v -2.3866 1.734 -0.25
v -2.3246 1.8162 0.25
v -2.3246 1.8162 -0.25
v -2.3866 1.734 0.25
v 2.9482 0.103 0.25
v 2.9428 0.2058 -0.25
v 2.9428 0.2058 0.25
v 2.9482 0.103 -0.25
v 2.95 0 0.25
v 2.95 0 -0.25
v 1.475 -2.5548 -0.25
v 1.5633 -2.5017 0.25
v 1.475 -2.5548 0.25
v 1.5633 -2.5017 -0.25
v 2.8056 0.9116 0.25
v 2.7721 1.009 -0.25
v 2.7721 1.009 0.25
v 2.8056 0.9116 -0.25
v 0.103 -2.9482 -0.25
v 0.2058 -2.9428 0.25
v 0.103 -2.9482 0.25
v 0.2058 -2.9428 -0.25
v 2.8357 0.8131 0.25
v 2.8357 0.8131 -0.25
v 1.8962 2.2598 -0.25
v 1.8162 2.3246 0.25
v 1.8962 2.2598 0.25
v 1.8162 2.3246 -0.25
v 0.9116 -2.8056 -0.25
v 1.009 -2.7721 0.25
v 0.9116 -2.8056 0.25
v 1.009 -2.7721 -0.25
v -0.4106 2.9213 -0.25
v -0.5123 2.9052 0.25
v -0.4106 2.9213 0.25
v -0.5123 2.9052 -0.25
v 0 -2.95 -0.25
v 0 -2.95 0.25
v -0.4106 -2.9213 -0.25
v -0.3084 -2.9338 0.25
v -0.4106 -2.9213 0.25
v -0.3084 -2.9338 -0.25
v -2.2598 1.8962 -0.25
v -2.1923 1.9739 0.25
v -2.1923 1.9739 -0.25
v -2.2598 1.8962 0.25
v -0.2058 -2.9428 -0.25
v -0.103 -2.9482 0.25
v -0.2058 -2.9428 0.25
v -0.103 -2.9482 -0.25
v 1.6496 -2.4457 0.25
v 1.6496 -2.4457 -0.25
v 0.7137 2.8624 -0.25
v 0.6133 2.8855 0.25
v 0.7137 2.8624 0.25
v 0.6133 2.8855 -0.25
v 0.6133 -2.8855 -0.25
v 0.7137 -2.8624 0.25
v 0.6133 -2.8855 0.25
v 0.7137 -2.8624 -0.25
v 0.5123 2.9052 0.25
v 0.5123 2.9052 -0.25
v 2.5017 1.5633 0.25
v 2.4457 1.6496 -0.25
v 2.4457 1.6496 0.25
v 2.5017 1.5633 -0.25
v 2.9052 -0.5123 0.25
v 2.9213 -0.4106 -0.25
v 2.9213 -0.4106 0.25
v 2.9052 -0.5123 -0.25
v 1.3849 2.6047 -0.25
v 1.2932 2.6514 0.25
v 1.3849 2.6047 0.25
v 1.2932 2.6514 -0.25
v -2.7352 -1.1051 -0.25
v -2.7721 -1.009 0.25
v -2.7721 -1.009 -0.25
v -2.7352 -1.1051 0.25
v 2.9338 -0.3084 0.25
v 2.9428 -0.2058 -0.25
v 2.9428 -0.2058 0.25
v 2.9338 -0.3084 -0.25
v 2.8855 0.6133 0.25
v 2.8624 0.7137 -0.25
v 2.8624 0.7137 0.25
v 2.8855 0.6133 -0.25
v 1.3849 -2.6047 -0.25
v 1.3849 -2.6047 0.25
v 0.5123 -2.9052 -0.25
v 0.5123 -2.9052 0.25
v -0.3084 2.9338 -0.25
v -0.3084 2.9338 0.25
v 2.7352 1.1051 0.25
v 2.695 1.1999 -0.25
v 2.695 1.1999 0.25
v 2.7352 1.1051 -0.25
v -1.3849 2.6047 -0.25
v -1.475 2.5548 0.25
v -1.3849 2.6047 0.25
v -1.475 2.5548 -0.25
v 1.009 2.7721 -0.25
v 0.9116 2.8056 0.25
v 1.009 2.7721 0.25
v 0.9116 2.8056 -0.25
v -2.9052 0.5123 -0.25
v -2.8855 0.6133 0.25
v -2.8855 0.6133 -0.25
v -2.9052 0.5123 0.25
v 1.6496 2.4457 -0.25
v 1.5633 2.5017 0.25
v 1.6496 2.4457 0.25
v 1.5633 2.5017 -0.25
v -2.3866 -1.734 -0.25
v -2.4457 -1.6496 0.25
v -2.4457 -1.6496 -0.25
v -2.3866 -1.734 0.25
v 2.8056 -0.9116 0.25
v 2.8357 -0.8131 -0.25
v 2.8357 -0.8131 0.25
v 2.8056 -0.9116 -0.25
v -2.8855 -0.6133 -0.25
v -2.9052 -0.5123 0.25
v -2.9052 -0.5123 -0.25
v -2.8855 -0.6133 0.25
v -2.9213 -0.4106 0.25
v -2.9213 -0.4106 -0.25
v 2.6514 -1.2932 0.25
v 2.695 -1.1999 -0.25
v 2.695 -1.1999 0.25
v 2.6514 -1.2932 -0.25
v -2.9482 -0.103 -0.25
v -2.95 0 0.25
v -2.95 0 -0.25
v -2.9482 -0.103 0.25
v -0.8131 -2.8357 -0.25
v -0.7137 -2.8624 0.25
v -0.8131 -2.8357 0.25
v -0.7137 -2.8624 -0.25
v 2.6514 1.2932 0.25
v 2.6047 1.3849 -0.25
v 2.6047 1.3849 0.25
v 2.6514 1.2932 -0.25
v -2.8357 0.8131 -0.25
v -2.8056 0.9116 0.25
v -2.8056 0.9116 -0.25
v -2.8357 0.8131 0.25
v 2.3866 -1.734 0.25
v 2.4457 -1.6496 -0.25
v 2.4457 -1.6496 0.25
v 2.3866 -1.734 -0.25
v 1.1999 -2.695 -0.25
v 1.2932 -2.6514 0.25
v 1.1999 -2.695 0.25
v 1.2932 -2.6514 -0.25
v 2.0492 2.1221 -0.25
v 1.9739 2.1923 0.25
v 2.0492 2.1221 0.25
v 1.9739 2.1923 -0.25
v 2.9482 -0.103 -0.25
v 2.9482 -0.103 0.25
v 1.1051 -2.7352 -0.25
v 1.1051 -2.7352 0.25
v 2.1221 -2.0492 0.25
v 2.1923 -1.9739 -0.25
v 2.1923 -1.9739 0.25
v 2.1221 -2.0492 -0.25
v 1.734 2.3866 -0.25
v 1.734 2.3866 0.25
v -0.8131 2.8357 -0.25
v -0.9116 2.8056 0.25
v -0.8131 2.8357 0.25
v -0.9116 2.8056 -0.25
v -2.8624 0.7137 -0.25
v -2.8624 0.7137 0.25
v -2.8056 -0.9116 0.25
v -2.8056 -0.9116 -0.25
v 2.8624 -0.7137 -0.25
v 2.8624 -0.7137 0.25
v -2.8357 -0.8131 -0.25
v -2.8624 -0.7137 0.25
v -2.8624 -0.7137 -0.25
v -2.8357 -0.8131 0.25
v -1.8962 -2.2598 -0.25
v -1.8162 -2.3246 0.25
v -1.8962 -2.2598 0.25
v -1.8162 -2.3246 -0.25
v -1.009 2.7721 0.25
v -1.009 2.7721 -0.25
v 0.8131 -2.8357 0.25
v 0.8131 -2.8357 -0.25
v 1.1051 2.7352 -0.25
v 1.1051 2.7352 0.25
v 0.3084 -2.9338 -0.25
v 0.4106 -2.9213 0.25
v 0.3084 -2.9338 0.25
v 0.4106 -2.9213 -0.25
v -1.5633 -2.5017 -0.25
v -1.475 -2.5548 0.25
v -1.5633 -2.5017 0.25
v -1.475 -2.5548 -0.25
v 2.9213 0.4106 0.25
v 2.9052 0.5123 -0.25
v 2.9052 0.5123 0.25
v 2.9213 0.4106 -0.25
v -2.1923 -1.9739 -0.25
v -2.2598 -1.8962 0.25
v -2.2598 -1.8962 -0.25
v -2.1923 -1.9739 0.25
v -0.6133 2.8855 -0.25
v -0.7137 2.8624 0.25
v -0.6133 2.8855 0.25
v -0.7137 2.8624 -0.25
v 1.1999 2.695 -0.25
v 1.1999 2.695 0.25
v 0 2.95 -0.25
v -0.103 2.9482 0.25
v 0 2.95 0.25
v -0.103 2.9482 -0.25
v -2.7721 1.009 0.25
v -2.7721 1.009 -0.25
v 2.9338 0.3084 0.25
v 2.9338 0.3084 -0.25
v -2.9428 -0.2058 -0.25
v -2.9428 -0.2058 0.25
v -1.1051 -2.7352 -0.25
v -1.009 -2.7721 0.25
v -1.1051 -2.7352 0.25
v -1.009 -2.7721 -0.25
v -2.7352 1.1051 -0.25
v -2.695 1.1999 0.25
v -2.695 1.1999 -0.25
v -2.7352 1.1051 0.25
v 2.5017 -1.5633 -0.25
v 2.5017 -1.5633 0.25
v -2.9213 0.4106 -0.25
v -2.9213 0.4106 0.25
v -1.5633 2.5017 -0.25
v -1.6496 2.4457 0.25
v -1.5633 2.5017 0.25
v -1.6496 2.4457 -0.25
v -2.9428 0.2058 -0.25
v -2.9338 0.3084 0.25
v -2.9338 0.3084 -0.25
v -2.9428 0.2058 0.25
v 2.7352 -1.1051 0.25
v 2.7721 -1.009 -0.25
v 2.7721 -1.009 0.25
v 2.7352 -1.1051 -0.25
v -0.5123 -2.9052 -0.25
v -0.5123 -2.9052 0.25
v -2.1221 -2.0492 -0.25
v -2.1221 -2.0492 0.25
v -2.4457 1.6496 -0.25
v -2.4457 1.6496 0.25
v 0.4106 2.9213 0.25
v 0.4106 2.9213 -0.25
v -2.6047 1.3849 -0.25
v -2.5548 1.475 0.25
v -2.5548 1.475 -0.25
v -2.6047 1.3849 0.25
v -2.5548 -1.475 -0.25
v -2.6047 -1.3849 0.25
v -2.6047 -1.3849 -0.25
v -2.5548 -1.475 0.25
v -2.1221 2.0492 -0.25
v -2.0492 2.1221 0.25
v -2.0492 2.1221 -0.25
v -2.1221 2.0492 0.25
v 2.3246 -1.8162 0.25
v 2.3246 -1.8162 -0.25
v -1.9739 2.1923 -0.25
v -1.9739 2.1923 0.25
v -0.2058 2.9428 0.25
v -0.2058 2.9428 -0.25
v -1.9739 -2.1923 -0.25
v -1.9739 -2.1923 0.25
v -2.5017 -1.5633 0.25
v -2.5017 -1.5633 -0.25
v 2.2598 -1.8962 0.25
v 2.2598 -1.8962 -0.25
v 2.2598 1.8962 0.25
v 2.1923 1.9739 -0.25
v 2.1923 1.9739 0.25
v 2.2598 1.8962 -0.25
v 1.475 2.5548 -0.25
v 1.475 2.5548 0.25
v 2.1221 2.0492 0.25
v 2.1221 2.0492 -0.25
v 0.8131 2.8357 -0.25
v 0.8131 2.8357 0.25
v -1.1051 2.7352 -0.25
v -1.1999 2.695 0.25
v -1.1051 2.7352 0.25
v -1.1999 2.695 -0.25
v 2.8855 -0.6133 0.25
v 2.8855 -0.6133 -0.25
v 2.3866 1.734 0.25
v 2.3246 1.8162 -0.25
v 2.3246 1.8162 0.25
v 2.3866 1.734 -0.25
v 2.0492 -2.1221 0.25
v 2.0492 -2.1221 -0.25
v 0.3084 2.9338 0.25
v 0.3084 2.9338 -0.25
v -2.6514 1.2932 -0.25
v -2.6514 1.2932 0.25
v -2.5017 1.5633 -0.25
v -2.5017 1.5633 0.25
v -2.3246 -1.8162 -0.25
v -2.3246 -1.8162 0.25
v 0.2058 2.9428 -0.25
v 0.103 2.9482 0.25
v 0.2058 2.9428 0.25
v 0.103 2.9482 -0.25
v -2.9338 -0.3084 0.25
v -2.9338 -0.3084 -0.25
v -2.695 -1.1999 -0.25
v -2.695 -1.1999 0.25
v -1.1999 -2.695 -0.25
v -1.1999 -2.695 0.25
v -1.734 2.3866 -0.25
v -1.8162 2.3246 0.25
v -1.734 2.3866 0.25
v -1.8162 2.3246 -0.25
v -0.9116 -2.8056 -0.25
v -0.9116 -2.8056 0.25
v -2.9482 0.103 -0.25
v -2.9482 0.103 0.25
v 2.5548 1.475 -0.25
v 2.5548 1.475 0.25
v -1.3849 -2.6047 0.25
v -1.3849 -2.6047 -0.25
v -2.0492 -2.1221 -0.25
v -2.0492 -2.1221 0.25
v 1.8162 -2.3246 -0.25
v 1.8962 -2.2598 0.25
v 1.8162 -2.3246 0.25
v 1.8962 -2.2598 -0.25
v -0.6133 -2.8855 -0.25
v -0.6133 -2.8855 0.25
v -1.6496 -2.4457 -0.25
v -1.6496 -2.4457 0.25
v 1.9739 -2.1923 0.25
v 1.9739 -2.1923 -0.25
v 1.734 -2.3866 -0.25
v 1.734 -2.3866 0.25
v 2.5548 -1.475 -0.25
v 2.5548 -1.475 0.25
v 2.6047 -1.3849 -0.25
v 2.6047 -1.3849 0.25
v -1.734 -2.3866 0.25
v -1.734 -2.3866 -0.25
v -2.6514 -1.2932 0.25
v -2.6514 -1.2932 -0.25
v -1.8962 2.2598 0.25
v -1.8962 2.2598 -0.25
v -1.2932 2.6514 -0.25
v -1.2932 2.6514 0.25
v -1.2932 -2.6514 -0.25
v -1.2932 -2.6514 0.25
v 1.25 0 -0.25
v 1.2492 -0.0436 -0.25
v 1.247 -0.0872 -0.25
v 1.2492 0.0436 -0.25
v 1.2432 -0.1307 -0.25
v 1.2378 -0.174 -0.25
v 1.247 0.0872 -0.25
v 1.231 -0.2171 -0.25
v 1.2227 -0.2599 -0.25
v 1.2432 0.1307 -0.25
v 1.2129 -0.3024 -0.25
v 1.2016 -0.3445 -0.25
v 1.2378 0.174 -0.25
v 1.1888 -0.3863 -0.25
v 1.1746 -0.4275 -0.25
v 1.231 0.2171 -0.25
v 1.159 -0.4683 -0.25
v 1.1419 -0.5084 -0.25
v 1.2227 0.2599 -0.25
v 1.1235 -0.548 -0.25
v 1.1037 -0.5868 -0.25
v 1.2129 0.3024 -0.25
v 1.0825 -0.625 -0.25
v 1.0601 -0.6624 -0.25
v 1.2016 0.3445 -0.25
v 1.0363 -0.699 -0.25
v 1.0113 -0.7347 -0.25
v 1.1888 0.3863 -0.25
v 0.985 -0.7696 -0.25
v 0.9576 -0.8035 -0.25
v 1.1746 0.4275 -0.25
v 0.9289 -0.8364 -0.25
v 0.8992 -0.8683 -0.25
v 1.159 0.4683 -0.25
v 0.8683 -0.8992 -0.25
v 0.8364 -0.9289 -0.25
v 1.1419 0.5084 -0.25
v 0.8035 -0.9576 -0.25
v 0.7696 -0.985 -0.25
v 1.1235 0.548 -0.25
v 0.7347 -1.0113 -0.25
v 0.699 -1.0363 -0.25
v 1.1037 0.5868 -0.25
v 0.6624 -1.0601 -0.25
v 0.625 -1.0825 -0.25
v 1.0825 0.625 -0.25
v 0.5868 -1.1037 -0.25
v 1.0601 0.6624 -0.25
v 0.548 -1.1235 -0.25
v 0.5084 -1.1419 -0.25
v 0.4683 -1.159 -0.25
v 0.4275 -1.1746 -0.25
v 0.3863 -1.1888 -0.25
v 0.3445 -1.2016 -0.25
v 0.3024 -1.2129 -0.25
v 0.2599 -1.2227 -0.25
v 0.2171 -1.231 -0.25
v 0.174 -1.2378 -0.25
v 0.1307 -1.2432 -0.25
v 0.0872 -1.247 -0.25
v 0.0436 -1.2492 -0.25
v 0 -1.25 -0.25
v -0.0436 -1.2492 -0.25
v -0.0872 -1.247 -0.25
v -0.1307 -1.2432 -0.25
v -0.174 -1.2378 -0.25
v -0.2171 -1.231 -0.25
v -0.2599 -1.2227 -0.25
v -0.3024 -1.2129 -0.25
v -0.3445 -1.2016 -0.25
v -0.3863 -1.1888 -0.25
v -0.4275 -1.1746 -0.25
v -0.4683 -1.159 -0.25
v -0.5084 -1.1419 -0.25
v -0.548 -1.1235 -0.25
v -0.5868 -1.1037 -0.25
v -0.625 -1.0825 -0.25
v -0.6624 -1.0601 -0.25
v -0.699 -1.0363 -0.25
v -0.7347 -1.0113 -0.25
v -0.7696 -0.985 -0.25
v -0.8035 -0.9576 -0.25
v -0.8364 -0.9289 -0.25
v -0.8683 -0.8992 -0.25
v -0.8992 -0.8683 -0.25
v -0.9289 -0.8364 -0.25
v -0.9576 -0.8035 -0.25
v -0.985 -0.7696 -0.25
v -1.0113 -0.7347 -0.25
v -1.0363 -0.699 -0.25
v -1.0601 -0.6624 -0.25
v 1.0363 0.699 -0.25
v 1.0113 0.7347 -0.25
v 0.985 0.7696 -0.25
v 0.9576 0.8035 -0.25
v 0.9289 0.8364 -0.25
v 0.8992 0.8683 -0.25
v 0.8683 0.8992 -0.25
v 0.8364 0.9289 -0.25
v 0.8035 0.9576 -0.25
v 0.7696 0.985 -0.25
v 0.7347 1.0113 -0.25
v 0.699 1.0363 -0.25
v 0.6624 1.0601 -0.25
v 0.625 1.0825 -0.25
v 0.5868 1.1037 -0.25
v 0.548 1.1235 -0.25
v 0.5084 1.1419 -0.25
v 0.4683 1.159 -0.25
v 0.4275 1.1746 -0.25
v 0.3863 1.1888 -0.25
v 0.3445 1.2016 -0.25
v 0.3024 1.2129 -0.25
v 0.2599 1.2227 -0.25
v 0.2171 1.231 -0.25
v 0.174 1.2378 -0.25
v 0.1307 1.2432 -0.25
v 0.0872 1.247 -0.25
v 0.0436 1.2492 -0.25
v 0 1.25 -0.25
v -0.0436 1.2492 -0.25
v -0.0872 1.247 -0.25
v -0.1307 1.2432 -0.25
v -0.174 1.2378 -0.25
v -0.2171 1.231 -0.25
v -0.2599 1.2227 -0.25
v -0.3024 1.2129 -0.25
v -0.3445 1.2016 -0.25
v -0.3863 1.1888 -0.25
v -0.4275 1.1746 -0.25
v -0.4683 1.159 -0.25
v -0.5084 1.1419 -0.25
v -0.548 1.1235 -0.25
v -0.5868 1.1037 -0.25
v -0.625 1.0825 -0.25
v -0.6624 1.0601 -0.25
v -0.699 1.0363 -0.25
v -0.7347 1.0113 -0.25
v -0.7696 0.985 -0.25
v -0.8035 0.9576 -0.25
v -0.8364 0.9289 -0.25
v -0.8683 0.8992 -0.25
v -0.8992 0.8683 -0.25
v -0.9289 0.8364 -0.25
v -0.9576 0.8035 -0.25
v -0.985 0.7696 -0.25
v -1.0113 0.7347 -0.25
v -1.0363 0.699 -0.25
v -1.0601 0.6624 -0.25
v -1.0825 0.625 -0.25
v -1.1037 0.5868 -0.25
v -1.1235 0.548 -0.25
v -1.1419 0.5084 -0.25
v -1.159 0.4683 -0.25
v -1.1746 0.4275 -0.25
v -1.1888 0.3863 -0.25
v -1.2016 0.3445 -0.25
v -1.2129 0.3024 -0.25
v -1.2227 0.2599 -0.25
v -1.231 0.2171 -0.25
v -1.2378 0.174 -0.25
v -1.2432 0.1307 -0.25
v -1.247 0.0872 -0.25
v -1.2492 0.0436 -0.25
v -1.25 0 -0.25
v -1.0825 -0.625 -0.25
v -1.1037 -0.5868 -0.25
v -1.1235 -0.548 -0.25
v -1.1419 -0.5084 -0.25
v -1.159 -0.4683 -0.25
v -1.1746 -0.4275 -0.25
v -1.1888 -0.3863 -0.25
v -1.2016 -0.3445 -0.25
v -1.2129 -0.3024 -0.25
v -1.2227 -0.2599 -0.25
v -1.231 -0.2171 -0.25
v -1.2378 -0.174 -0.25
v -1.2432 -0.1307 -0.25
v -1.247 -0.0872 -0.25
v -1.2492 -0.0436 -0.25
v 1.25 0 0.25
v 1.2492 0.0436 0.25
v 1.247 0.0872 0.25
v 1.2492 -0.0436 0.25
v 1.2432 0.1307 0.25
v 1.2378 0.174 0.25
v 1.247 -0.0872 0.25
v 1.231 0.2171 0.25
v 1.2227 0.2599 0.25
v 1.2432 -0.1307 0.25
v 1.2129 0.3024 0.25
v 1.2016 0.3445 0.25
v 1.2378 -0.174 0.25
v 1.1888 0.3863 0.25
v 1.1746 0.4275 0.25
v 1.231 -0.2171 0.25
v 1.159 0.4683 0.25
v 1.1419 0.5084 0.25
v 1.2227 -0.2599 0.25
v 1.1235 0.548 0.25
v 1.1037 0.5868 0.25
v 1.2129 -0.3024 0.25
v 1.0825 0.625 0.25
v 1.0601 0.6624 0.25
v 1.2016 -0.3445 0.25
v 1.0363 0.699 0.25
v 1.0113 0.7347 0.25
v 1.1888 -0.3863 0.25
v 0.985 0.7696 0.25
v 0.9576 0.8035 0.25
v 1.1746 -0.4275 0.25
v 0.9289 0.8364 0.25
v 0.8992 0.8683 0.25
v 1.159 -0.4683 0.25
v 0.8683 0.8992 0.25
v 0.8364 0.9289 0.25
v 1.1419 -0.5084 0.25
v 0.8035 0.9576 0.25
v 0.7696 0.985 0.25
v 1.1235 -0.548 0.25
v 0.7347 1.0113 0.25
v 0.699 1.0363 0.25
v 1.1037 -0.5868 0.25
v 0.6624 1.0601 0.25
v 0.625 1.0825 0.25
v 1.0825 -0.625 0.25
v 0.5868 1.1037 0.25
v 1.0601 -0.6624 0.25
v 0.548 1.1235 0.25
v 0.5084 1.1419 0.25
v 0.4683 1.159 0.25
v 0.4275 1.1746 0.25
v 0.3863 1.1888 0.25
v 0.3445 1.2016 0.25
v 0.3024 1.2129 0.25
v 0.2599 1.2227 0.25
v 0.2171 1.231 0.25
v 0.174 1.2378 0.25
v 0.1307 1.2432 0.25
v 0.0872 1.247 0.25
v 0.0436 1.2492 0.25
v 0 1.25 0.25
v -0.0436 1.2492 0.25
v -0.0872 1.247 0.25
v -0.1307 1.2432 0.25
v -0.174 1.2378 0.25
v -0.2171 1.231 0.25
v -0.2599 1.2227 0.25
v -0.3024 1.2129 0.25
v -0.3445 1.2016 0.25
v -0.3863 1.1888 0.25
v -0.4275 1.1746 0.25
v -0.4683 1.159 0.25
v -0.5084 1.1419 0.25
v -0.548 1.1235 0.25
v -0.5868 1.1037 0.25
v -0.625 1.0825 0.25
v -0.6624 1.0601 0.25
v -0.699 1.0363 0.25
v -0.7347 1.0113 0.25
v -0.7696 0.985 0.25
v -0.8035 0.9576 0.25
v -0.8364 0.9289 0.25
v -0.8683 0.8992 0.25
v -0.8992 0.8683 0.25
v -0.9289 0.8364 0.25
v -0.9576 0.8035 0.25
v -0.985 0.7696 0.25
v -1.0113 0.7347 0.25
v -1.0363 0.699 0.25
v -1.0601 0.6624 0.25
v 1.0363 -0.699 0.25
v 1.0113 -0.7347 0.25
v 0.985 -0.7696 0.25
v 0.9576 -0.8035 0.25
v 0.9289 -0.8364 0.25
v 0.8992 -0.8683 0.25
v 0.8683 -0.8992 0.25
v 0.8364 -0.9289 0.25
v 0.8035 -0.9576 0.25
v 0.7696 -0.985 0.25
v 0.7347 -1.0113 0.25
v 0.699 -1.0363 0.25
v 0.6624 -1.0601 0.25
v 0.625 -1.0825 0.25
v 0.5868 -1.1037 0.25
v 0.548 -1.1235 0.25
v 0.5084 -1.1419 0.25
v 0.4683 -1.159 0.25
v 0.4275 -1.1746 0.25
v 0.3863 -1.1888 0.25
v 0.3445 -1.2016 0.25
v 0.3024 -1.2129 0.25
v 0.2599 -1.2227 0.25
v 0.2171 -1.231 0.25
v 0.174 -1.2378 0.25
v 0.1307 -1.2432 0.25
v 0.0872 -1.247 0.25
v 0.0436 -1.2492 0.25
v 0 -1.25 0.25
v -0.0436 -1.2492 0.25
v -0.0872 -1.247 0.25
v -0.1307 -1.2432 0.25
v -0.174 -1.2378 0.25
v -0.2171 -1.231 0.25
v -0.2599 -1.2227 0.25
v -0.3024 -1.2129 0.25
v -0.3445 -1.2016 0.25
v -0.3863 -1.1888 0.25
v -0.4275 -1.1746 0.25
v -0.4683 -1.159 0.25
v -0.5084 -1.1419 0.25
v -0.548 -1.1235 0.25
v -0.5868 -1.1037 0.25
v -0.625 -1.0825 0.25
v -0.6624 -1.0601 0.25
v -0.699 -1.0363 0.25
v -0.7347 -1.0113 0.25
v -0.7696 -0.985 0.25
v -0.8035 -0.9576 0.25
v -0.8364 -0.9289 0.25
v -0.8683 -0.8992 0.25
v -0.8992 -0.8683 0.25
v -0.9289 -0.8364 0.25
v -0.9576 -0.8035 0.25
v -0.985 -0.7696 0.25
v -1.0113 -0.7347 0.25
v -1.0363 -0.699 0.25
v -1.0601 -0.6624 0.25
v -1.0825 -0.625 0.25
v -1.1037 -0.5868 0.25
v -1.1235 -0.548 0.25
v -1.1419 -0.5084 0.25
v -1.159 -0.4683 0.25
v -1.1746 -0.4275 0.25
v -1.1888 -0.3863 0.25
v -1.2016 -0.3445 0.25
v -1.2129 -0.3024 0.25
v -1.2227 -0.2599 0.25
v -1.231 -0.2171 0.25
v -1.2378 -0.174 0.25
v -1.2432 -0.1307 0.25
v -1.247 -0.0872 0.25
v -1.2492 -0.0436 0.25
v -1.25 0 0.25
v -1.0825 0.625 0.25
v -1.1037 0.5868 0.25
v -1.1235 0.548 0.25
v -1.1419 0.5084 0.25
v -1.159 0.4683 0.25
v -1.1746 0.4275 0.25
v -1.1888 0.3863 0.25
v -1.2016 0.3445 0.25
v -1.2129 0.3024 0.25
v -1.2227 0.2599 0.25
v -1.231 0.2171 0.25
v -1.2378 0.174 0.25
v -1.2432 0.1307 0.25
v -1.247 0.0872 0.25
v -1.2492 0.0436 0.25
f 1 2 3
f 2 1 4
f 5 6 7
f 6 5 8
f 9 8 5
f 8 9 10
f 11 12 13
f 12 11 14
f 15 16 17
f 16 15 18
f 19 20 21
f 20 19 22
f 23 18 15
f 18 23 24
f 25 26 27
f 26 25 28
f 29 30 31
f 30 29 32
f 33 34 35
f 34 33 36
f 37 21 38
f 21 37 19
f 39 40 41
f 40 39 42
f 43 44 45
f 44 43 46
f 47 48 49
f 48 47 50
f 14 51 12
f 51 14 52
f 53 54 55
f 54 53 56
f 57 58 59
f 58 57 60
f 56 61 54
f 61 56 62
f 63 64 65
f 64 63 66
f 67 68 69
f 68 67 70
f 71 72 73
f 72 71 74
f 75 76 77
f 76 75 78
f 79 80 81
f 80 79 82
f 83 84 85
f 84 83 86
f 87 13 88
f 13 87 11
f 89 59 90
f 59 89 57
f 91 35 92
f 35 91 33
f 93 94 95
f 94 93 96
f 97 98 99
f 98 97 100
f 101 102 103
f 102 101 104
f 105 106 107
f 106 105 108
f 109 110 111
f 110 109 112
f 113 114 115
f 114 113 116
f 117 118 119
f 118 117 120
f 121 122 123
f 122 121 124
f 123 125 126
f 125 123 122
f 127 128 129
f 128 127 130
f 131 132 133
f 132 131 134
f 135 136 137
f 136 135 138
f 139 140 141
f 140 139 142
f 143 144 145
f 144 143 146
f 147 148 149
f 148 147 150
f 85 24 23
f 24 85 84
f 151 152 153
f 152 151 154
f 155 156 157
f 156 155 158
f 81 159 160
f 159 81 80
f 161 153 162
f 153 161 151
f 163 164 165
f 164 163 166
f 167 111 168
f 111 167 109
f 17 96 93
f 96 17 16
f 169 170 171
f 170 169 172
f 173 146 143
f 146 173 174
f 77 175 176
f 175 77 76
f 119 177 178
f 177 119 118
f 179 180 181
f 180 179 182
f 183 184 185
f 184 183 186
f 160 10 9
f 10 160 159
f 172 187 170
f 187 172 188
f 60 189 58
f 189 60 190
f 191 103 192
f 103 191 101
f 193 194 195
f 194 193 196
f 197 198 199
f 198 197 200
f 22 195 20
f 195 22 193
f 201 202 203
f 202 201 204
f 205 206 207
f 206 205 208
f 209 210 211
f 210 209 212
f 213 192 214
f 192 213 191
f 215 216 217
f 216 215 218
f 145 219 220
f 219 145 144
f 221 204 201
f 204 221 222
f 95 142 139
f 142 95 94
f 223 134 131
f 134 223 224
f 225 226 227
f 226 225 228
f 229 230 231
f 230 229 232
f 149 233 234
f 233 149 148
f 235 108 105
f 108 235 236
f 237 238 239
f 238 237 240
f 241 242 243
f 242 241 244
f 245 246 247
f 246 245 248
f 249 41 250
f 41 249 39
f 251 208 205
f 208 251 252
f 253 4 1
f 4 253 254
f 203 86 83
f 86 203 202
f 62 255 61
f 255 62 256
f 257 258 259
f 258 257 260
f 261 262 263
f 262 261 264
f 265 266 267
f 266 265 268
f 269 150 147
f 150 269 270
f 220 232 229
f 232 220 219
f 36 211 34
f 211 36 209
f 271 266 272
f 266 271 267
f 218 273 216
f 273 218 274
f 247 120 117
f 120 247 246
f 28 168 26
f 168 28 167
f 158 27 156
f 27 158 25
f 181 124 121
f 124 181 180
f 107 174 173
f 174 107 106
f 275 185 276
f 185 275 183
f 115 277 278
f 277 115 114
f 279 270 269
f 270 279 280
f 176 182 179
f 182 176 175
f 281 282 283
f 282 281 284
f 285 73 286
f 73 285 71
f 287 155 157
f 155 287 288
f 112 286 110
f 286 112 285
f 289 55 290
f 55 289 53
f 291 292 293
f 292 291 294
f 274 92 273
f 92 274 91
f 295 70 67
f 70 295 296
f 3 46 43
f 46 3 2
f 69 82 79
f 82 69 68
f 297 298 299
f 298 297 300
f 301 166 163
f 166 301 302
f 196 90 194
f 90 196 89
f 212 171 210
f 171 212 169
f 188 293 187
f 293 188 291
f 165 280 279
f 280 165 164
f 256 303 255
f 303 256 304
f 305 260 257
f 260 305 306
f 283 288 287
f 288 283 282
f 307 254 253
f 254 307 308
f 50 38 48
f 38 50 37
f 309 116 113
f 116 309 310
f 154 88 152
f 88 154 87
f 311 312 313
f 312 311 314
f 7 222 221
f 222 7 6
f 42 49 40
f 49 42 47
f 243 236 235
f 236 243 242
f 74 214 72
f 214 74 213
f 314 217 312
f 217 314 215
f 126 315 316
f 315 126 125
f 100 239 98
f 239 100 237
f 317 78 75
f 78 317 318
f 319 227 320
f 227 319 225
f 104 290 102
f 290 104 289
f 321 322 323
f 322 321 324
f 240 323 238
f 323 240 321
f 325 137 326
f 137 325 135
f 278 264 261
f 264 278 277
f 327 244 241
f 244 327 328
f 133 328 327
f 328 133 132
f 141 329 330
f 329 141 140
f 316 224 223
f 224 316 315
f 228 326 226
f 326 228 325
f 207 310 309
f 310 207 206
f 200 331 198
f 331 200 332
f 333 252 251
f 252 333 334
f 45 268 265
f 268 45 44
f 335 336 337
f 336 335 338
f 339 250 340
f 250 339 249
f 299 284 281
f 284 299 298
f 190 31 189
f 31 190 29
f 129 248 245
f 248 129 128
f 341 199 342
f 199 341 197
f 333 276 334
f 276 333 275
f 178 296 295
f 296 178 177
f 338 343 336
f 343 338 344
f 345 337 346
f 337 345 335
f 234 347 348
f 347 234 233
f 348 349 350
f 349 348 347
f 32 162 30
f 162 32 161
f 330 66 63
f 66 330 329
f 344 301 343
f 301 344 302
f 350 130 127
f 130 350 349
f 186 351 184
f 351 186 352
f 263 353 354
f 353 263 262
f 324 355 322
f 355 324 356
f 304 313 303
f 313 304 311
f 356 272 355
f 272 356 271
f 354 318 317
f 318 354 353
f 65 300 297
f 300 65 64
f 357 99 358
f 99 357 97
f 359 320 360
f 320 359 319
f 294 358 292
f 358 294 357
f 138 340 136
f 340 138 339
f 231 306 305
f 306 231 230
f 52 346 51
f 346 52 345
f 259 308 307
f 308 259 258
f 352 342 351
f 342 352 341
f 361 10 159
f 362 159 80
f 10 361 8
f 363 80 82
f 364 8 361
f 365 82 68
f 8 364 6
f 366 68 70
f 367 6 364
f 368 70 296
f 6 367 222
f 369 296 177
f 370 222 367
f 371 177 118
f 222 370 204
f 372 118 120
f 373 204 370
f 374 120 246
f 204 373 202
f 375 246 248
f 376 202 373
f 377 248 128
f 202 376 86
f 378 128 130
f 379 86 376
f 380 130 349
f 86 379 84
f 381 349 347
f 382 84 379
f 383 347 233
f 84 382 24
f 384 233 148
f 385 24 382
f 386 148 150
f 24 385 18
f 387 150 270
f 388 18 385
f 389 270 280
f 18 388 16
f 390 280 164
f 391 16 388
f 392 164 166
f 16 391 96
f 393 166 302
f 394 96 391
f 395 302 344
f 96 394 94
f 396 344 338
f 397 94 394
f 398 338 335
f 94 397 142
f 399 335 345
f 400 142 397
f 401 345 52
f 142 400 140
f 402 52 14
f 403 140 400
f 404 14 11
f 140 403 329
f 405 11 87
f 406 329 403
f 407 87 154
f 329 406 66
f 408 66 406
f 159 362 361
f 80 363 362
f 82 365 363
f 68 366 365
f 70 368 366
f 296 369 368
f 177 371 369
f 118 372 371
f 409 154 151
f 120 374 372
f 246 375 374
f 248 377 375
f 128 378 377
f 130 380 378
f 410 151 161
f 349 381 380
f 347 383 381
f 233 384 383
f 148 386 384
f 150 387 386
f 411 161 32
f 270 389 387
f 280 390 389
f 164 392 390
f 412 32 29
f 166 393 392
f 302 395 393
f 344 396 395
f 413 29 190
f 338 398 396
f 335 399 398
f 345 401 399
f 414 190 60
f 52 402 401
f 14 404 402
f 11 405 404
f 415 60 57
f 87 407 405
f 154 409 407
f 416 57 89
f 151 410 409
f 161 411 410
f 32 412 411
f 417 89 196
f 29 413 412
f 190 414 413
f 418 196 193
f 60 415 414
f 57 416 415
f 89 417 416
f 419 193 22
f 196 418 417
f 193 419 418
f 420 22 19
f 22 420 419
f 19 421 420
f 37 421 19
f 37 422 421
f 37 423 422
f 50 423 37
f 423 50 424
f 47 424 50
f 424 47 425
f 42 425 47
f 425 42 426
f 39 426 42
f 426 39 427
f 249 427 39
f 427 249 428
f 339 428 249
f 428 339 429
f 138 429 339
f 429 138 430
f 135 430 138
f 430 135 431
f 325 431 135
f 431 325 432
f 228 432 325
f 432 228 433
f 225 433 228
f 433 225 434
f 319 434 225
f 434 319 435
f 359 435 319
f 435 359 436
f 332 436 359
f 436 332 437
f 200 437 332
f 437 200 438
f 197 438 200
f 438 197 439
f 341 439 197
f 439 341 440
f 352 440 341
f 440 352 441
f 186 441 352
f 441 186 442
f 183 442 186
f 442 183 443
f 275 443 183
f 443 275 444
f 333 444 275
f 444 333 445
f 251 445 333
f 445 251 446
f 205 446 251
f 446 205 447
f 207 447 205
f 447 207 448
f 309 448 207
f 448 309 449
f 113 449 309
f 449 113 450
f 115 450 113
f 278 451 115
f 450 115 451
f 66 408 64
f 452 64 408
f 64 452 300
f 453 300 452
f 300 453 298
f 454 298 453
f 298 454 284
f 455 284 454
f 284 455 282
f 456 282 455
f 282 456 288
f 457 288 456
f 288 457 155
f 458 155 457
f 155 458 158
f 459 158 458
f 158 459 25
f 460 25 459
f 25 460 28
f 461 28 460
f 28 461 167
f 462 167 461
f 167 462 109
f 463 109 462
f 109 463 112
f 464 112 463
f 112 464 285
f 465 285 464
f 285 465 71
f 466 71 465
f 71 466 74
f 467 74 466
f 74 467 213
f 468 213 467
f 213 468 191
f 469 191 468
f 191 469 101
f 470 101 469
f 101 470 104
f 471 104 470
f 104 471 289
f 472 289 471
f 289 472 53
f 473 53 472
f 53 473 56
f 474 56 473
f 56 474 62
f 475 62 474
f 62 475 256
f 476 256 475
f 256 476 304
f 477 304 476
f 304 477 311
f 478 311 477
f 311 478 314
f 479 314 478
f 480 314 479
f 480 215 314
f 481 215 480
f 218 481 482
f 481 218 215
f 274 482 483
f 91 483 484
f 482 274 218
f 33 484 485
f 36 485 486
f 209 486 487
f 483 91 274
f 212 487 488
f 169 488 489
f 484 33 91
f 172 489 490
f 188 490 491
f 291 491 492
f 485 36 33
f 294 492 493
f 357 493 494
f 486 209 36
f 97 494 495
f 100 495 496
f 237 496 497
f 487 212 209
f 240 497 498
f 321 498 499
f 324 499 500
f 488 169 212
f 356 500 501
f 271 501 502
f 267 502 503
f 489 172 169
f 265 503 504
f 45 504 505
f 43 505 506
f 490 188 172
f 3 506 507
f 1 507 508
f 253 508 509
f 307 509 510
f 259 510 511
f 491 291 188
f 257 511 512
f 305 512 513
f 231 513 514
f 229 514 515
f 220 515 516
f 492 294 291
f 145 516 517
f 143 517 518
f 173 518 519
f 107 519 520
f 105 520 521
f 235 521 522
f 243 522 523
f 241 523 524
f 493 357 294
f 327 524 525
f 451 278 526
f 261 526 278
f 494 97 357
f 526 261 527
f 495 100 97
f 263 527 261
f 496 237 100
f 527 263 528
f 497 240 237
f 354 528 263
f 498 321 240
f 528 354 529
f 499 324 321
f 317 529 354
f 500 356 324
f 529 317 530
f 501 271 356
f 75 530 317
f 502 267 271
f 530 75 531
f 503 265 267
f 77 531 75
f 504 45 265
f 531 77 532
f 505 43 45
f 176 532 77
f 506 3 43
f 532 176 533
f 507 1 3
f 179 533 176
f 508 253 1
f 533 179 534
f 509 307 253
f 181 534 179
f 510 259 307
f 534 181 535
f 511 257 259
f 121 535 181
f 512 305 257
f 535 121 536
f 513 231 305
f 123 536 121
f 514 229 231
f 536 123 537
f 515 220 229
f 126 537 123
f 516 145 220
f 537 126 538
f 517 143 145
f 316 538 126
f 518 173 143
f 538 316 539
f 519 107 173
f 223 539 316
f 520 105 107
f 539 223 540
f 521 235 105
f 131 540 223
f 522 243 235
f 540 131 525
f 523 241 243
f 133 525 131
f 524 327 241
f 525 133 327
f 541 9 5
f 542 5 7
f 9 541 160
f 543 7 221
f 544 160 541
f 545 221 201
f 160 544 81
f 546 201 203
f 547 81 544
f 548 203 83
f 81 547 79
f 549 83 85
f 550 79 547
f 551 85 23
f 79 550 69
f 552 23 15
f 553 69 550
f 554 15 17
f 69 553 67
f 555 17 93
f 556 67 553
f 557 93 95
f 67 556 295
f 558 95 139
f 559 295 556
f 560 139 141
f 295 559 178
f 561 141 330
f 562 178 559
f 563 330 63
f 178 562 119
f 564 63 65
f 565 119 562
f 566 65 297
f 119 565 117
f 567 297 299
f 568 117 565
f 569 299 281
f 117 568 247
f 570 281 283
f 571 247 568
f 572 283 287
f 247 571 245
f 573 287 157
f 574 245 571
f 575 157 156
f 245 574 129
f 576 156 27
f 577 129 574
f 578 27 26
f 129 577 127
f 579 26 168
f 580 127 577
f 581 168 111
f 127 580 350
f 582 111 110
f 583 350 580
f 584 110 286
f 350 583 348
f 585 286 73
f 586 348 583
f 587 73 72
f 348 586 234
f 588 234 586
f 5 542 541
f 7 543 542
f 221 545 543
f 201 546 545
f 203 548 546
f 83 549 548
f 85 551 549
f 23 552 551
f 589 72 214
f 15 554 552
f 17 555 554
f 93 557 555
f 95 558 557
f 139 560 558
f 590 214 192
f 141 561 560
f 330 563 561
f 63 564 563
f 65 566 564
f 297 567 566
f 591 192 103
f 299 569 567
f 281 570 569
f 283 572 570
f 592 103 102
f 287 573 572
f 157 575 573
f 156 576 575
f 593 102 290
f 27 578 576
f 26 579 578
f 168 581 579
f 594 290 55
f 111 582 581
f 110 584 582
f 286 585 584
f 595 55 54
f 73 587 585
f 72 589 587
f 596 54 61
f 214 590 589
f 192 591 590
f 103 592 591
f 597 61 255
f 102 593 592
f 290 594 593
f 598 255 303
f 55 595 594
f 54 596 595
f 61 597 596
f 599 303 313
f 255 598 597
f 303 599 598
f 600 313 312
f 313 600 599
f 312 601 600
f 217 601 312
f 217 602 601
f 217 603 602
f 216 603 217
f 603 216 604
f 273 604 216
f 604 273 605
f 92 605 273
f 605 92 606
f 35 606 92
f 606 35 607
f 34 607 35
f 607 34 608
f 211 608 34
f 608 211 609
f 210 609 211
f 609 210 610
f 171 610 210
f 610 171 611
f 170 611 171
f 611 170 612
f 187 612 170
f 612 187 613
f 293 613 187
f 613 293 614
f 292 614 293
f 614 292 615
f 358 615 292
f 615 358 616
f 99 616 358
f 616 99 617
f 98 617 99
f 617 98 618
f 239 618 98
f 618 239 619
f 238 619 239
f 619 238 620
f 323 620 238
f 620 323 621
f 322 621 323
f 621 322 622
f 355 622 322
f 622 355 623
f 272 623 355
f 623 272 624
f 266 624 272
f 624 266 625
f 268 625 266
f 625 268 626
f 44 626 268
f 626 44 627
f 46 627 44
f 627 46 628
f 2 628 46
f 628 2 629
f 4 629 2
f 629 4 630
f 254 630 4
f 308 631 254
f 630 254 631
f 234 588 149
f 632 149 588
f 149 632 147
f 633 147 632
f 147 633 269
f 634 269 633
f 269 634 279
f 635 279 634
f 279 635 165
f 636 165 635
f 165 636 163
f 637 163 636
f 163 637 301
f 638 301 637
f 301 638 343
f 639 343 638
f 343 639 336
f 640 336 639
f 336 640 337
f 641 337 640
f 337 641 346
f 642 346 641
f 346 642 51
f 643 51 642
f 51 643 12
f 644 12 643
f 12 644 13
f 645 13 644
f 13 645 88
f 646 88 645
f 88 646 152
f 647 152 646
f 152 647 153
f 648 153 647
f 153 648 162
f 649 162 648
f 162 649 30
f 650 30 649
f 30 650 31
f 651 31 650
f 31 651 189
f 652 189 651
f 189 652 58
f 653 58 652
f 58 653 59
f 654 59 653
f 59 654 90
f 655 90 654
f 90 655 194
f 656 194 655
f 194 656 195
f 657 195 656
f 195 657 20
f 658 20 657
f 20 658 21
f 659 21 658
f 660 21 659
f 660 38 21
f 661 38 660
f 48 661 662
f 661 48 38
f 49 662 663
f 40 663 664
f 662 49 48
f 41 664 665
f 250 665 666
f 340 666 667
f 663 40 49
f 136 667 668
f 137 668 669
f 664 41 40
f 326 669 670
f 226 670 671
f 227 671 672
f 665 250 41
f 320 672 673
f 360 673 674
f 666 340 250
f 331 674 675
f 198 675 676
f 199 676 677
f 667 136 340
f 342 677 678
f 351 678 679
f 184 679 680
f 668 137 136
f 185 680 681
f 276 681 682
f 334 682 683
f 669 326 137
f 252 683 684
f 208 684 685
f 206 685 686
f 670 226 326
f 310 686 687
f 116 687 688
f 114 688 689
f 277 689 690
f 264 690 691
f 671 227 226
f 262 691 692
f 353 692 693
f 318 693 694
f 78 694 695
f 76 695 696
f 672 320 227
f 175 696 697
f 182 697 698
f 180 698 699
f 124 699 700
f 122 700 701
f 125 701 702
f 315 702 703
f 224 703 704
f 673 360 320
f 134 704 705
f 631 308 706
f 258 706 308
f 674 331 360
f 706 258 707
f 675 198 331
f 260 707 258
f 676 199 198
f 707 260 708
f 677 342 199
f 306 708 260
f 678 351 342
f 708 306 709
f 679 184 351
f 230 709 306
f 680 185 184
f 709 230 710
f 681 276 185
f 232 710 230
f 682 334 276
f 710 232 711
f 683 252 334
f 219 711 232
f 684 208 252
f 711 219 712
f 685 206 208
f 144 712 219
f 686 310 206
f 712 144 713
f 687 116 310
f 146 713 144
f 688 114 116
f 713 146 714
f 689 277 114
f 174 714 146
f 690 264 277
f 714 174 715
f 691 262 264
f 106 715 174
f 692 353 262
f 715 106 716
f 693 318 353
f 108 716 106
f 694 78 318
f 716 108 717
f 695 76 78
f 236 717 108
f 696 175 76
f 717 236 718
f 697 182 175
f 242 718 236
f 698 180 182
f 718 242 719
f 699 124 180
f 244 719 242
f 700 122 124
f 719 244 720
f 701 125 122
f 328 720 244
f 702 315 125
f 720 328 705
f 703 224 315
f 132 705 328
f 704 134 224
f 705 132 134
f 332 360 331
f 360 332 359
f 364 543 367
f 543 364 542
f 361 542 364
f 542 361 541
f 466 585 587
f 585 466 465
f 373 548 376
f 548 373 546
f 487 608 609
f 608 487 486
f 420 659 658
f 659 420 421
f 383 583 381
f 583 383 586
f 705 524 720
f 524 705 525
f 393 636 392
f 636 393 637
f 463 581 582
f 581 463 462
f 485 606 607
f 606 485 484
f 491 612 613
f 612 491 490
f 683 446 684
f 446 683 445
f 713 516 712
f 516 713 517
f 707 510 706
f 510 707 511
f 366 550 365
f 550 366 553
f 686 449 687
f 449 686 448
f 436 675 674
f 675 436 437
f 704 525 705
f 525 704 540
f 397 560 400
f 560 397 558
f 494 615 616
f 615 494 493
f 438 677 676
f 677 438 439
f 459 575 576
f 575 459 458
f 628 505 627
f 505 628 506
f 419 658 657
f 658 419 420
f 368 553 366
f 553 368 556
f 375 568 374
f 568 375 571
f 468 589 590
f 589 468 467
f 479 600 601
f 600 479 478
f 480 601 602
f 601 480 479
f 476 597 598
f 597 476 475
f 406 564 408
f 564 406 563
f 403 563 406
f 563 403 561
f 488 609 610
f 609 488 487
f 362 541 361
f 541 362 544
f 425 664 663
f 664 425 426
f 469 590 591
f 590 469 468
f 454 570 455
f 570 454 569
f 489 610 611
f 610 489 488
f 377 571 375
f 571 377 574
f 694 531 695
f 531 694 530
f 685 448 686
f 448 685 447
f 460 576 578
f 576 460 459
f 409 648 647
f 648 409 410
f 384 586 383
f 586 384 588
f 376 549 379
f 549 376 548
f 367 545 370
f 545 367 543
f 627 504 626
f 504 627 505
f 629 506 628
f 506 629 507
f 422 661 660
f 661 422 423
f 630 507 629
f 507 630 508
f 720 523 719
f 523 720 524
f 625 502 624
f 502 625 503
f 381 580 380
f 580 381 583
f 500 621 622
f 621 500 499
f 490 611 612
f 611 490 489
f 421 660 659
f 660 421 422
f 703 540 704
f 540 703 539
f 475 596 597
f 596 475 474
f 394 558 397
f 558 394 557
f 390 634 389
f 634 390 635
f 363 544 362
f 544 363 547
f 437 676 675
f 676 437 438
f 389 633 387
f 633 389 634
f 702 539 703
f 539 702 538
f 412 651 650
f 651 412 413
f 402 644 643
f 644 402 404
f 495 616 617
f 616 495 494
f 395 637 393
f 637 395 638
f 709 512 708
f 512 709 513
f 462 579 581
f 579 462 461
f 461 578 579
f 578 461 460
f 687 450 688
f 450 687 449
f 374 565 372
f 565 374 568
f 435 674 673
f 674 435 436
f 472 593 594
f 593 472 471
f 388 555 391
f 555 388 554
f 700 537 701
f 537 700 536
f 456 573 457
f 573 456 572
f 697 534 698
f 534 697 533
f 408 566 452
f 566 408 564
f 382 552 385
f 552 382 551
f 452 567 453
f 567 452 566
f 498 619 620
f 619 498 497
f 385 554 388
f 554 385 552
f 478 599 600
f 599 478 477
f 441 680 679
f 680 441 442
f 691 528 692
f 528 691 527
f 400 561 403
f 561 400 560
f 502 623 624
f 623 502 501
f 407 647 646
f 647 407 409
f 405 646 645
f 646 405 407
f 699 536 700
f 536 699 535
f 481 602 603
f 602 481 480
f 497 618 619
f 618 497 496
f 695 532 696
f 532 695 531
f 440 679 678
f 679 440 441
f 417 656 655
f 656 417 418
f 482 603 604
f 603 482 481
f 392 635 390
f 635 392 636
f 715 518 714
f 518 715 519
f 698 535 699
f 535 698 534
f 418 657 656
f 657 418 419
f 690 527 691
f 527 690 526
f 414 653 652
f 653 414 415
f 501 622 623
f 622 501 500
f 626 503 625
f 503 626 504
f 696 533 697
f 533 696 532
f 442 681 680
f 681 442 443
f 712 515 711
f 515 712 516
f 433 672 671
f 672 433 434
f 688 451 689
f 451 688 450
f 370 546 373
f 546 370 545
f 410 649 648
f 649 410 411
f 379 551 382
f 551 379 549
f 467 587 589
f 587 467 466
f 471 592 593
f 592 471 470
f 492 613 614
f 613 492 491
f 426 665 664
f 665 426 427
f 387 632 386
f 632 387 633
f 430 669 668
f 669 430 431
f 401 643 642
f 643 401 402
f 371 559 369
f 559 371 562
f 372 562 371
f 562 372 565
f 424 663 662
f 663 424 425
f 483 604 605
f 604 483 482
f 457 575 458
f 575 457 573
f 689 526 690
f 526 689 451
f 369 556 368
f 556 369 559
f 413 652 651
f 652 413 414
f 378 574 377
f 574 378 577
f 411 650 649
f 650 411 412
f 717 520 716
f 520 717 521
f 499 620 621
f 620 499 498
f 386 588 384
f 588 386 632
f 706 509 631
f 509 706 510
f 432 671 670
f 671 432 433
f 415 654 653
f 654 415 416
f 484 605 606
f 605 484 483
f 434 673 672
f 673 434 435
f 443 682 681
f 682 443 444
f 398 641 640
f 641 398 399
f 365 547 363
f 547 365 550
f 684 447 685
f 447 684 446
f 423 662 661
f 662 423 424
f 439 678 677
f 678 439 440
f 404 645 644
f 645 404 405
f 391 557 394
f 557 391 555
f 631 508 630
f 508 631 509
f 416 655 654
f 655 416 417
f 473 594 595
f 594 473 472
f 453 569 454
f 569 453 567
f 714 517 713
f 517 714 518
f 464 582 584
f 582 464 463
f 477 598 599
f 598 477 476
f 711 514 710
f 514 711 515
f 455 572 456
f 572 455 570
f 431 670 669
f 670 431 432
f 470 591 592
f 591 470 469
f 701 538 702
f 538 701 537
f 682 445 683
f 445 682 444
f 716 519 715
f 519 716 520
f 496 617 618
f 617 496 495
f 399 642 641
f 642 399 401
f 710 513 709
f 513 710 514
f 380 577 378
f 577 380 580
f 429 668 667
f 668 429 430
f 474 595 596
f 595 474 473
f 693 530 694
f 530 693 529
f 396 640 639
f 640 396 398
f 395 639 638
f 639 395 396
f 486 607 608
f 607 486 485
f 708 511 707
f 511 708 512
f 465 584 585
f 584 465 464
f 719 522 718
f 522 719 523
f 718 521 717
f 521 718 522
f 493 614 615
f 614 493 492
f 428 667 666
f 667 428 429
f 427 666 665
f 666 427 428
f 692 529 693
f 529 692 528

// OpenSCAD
module washer(inner_d=2.5, outer_d=5.9, thickness=0.5, fn=180) {
    difference() {
        cylinder(h=thickness, d=outer_d, center=true, $fn=fn);
        cylinder(h=thickness + 0.2, d=inner_d, center=true, $fn=fn);
    }
}

washer();
